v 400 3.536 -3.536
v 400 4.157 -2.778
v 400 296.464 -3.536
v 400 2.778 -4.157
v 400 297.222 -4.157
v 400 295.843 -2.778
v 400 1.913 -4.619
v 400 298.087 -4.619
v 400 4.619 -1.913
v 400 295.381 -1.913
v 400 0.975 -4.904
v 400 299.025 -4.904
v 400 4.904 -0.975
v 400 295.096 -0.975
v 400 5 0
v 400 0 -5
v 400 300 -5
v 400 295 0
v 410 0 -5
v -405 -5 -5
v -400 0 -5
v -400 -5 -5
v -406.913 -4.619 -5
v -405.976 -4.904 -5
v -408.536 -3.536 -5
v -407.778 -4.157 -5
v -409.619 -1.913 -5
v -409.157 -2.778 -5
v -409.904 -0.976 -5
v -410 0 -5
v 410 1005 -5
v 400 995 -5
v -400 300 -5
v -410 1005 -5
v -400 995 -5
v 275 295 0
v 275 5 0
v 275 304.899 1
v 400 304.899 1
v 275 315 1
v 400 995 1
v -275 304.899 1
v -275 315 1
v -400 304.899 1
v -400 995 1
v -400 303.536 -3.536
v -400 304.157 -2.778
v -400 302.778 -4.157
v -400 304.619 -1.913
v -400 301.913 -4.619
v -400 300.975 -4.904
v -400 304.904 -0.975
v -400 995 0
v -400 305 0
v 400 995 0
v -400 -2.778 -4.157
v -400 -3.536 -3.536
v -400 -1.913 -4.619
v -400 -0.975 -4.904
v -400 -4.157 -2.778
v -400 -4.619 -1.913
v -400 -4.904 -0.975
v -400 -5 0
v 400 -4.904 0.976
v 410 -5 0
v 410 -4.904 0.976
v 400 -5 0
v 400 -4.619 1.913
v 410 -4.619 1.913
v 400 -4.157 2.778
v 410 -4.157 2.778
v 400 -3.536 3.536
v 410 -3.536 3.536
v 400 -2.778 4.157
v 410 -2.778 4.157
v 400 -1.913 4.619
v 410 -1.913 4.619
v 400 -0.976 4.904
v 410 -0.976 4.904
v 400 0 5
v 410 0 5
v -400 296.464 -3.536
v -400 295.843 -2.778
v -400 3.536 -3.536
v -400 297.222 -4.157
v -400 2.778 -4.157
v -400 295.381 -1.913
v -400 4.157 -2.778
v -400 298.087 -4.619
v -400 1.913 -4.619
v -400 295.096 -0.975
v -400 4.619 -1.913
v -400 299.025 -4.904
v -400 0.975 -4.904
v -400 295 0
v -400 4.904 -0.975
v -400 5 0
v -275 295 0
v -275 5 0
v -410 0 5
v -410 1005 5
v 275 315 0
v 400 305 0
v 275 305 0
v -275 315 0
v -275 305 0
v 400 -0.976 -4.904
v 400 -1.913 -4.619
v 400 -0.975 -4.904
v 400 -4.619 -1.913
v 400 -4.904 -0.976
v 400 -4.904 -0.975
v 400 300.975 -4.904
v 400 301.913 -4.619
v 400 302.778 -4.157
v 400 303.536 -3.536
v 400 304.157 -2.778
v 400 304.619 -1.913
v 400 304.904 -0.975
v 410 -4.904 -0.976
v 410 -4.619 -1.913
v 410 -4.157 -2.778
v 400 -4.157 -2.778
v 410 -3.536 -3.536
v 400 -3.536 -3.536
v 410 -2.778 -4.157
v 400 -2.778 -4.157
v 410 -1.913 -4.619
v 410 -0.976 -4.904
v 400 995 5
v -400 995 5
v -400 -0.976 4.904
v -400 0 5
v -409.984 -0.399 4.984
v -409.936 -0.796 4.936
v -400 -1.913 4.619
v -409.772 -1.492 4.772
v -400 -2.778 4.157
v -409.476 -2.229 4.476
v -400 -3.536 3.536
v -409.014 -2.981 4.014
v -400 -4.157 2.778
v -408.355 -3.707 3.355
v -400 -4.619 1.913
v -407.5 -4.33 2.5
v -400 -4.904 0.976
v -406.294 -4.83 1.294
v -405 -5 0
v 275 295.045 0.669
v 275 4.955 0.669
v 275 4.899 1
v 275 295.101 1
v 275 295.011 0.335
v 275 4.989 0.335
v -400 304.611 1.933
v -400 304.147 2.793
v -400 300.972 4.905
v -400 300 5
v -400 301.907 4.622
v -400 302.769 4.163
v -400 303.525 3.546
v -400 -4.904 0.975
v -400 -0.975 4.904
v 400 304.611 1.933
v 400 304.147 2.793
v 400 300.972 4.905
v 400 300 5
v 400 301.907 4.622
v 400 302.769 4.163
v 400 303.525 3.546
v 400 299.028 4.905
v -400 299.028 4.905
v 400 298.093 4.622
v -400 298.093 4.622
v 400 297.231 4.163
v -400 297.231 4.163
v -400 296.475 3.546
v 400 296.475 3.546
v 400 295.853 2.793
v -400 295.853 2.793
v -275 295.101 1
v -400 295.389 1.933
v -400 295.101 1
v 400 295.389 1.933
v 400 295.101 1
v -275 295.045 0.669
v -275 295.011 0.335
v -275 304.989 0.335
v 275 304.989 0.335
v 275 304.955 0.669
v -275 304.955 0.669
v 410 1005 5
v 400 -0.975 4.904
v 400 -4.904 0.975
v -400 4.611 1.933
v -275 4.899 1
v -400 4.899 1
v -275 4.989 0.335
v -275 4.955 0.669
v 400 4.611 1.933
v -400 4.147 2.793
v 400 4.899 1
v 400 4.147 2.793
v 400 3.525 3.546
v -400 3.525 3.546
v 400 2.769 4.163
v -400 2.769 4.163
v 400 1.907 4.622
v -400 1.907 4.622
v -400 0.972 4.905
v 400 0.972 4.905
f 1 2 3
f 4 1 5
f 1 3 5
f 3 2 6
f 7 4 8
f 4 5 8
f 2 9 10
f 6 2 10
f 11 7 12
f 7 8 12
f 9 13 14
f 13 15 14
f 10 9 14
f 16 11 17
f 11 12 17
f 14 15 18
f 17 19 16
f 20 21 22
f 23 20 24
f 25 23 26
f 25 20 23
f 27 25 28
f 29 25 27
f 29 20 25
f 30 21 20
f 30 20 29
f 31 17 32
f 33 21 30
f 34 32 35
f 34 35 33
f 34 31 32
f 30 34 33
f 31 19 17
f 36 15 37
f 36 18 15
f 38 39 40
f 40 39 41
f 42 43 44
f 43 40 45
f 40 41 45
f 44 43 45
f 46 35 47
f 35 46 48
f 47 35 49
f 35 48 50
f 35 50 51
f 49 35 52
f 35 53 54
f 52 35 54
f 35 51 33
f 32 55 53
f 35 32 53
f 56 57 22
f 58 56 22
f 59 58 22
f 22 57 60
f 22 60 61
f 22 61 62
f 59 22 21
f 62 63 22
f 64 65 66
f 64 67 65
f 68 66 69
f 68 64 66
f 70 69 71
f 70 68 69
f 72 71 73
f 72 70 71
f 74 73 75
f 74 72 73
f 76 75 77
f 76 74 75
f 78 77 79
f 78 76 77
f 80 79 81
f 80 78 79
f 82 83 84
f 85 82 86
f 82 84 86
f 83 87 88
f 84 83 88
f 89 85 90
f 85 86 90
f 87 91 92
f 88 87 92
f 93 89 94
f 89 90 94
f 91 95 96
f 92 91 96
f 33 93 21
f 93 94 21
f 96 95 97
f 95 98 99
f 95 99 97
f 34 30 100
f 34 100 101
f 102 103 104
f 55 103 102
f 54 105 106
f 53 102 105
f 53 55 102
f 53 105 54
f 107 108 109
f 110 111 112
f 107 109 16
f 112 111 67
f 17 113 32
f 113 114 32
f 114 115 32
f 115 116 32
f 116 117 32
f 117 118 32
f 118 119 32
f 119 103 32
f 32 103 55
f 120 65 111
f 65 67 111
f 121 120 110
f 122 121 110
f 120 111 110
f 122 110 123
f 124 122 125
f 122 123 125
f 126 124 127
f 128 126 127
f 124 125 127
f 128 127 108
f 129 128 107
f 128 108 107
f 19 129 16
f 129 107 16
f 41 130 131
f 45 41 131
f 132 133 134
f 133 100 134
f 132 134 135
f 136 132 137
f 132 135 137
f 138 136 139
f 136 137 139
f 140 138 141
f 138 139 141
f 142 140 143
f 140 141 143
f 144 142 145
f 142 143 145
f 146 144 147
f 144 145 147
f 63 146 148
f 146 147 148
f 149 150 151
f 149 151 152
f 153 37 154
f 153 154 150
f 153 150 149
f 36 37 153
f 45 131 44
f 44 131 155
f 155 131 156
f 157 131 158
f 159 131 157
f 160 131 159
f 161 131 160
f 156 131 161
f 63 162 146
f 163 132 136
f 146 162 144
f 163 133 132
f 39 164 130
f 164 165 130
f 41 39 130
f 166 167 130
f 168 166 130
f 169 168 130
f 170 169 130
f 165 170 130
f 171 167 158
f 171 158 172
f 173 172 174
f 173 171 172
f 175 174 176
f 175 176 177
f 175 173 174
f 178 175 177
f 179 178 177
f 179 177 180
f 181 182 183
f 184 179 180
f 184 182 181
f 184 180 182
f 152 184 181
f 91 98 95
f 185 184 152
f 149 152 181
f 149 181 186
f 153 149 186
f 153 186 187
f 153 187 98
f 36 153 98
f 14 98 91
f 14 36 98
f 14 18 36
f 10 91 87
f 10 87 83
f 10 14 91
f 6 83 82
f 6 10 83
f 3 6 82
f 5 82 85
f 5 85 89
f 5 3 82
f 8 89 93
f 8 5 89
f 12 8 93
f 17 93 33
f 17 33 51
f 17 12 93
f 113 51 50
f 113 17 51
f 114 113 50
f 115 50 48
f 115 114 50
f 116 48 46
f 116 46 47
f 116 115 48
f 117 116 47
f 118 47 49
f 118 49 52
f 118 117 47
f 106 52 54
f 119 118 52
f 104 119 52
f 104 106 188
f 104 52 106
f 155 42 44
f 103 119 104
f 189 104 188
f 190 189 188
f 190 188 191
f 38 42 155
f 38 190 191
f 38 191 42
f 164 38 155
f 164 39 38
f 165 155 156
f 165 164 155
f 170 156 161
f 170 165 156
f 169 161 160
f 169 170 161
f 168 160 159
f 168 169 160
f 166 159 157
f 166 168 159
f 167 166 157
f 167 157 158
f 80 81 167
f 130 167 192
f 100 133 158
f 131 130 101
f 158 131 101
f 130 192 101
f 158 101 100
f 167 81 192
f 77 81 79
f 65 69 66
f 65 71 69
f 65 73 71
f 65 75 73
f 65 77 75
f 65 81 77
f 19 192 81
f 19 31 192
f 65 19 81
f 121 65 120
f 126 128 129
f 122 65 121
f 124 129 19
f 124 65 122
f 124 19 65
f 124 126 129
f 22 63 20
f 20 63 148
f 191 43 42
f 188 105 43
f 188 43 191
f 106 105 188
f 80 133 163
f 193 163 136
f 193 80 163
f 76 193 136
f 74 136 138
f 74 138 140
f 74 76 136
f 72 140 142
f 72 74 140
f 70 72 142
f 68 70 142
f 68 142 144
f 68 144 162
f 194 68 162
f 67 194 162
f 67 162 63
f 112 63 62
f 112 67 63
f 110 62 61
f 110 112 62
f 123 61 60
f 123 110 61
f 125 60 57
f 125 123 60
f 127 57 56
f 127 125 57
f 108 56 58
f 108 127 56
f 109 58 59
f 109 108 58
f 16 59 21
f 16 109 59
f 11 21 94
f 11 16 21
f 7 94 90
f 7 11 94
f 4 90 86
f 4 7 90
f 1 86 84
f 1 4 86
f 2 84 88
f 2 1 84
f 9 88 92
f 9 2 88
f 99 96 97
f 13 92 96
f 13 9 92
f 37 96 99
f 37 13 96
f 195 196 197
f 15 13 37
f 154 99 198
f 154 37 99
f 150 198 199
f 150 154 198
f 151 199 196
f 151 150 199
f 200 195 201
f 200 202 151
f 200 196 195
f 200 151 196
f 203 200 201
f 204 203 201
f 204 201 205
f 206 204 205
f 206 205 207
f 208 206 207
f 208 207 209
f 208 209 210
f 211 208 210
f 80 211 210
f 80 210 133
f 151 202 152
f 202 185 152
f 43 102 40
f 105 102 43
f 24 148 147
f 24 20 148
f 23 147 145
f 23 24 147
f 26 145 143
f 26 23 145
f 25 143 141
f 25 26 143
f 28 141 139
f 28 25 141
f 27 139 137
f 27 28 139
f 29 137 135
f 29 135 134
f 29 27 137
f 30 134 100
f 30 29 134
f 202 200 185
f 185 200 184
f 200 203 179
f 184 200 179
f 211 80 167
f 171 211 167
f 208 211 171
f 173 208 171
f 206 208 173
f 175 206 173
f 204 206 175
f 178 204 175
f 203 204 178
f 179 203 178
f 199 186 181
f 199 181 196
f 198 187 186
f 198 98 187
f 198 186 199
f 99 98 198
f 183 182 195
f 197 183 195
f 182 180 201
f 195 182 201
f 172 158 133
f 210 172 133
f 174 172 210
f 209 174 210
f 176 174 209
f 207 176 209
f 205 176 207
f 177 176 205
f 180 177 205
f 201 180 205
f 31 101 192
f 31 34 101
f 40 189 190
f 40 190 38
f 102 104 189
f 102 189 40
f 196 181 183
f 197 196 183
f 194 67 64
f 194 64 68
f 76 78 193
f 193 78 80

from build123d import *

# Parameters (mm, degrees)
SWEEP2_PROFILE_R    = 5
SWEEP3_PROFILE_R    = 5
EXTRUDE_THIN2_DEPTH = 5
FILLET4_R           = 5
BOSS_EXTRUDE1_DEPTH = 1


with BuildPart() as part:
    # Sweep2: sweep along a path in Sketch14
    with BuildLine(Plane.XY) as sweep2_path:
        Line((-400, 0), (400, 0))
    # Sweep2 profile (on start of the path) → Sweep2 (sweep)
    with BuildSketch(Plane(origin=(-400, 0, 0), x_dir=(0, 0, 1), z_dir=(1, 0, 0))):
        Circle(SWEEP2_PROFILE_R)
    sweep(path=sweep2_path.line)



with BuildPart() as body_2:
    # Sweep3: sweep along a path in Sketch14<3>
    with BuildLine(Plane.XY) as sweep3_path:
        Line((-400, 300), (400, 300))
    # Sweep3 profile (on start of the path) → Sweep3 (sweep)
    with BuildSketch(Plane(origin=(-400, 300, 0), x_dir=(0, 0, 1), z_dir=(1, 0, 0))):
        Circle(SWEEP3_PROFILE_R)
    sweep(path=sweep3_path.line)


with BuildPart() as part_1:
    add(part.part)

    add(body_2.part)  # Extrude-Thin2 merges body 2
    # Sketch31 → Extrude-Thin2 (add, symmetric)
    with BuildSketch(Plane.XY):
        Polygon((400, -5), (400, 995), (-400, 995), (-400, -5), (-410, -5), (-410, 1005), (410, 1005), (410, -5), align=None)
    extrude(amount=EXTRUDE_THIN2_DEPTH, both=True)

    # Fillet4
    fillet4_edges = [part_1.edges().sort_by_distance(p)[0] for p in [
        (405, -5, -5),
        (405, -5, 5),
        (-410, -5, 0),
        (-405, -5, 5),
    ]]
    fillet(fillet4_edges, radius=FILLET4_R - 0.0001)  # a hair under: the kernel refuses the full size

    # Sketch32 → Boss-Extrude1 (add)
    with BuildSketch(Plane.XY):
        Polygon((275, 0), (275, 315), (-275, 315), (-275, 0), (-410, 0), (-410, 1005), (410, 1005), (410, 0), align=None)
    extrude(amount=BOSS_EXTRUDE1_DEPTH)


solid = part_1.part
